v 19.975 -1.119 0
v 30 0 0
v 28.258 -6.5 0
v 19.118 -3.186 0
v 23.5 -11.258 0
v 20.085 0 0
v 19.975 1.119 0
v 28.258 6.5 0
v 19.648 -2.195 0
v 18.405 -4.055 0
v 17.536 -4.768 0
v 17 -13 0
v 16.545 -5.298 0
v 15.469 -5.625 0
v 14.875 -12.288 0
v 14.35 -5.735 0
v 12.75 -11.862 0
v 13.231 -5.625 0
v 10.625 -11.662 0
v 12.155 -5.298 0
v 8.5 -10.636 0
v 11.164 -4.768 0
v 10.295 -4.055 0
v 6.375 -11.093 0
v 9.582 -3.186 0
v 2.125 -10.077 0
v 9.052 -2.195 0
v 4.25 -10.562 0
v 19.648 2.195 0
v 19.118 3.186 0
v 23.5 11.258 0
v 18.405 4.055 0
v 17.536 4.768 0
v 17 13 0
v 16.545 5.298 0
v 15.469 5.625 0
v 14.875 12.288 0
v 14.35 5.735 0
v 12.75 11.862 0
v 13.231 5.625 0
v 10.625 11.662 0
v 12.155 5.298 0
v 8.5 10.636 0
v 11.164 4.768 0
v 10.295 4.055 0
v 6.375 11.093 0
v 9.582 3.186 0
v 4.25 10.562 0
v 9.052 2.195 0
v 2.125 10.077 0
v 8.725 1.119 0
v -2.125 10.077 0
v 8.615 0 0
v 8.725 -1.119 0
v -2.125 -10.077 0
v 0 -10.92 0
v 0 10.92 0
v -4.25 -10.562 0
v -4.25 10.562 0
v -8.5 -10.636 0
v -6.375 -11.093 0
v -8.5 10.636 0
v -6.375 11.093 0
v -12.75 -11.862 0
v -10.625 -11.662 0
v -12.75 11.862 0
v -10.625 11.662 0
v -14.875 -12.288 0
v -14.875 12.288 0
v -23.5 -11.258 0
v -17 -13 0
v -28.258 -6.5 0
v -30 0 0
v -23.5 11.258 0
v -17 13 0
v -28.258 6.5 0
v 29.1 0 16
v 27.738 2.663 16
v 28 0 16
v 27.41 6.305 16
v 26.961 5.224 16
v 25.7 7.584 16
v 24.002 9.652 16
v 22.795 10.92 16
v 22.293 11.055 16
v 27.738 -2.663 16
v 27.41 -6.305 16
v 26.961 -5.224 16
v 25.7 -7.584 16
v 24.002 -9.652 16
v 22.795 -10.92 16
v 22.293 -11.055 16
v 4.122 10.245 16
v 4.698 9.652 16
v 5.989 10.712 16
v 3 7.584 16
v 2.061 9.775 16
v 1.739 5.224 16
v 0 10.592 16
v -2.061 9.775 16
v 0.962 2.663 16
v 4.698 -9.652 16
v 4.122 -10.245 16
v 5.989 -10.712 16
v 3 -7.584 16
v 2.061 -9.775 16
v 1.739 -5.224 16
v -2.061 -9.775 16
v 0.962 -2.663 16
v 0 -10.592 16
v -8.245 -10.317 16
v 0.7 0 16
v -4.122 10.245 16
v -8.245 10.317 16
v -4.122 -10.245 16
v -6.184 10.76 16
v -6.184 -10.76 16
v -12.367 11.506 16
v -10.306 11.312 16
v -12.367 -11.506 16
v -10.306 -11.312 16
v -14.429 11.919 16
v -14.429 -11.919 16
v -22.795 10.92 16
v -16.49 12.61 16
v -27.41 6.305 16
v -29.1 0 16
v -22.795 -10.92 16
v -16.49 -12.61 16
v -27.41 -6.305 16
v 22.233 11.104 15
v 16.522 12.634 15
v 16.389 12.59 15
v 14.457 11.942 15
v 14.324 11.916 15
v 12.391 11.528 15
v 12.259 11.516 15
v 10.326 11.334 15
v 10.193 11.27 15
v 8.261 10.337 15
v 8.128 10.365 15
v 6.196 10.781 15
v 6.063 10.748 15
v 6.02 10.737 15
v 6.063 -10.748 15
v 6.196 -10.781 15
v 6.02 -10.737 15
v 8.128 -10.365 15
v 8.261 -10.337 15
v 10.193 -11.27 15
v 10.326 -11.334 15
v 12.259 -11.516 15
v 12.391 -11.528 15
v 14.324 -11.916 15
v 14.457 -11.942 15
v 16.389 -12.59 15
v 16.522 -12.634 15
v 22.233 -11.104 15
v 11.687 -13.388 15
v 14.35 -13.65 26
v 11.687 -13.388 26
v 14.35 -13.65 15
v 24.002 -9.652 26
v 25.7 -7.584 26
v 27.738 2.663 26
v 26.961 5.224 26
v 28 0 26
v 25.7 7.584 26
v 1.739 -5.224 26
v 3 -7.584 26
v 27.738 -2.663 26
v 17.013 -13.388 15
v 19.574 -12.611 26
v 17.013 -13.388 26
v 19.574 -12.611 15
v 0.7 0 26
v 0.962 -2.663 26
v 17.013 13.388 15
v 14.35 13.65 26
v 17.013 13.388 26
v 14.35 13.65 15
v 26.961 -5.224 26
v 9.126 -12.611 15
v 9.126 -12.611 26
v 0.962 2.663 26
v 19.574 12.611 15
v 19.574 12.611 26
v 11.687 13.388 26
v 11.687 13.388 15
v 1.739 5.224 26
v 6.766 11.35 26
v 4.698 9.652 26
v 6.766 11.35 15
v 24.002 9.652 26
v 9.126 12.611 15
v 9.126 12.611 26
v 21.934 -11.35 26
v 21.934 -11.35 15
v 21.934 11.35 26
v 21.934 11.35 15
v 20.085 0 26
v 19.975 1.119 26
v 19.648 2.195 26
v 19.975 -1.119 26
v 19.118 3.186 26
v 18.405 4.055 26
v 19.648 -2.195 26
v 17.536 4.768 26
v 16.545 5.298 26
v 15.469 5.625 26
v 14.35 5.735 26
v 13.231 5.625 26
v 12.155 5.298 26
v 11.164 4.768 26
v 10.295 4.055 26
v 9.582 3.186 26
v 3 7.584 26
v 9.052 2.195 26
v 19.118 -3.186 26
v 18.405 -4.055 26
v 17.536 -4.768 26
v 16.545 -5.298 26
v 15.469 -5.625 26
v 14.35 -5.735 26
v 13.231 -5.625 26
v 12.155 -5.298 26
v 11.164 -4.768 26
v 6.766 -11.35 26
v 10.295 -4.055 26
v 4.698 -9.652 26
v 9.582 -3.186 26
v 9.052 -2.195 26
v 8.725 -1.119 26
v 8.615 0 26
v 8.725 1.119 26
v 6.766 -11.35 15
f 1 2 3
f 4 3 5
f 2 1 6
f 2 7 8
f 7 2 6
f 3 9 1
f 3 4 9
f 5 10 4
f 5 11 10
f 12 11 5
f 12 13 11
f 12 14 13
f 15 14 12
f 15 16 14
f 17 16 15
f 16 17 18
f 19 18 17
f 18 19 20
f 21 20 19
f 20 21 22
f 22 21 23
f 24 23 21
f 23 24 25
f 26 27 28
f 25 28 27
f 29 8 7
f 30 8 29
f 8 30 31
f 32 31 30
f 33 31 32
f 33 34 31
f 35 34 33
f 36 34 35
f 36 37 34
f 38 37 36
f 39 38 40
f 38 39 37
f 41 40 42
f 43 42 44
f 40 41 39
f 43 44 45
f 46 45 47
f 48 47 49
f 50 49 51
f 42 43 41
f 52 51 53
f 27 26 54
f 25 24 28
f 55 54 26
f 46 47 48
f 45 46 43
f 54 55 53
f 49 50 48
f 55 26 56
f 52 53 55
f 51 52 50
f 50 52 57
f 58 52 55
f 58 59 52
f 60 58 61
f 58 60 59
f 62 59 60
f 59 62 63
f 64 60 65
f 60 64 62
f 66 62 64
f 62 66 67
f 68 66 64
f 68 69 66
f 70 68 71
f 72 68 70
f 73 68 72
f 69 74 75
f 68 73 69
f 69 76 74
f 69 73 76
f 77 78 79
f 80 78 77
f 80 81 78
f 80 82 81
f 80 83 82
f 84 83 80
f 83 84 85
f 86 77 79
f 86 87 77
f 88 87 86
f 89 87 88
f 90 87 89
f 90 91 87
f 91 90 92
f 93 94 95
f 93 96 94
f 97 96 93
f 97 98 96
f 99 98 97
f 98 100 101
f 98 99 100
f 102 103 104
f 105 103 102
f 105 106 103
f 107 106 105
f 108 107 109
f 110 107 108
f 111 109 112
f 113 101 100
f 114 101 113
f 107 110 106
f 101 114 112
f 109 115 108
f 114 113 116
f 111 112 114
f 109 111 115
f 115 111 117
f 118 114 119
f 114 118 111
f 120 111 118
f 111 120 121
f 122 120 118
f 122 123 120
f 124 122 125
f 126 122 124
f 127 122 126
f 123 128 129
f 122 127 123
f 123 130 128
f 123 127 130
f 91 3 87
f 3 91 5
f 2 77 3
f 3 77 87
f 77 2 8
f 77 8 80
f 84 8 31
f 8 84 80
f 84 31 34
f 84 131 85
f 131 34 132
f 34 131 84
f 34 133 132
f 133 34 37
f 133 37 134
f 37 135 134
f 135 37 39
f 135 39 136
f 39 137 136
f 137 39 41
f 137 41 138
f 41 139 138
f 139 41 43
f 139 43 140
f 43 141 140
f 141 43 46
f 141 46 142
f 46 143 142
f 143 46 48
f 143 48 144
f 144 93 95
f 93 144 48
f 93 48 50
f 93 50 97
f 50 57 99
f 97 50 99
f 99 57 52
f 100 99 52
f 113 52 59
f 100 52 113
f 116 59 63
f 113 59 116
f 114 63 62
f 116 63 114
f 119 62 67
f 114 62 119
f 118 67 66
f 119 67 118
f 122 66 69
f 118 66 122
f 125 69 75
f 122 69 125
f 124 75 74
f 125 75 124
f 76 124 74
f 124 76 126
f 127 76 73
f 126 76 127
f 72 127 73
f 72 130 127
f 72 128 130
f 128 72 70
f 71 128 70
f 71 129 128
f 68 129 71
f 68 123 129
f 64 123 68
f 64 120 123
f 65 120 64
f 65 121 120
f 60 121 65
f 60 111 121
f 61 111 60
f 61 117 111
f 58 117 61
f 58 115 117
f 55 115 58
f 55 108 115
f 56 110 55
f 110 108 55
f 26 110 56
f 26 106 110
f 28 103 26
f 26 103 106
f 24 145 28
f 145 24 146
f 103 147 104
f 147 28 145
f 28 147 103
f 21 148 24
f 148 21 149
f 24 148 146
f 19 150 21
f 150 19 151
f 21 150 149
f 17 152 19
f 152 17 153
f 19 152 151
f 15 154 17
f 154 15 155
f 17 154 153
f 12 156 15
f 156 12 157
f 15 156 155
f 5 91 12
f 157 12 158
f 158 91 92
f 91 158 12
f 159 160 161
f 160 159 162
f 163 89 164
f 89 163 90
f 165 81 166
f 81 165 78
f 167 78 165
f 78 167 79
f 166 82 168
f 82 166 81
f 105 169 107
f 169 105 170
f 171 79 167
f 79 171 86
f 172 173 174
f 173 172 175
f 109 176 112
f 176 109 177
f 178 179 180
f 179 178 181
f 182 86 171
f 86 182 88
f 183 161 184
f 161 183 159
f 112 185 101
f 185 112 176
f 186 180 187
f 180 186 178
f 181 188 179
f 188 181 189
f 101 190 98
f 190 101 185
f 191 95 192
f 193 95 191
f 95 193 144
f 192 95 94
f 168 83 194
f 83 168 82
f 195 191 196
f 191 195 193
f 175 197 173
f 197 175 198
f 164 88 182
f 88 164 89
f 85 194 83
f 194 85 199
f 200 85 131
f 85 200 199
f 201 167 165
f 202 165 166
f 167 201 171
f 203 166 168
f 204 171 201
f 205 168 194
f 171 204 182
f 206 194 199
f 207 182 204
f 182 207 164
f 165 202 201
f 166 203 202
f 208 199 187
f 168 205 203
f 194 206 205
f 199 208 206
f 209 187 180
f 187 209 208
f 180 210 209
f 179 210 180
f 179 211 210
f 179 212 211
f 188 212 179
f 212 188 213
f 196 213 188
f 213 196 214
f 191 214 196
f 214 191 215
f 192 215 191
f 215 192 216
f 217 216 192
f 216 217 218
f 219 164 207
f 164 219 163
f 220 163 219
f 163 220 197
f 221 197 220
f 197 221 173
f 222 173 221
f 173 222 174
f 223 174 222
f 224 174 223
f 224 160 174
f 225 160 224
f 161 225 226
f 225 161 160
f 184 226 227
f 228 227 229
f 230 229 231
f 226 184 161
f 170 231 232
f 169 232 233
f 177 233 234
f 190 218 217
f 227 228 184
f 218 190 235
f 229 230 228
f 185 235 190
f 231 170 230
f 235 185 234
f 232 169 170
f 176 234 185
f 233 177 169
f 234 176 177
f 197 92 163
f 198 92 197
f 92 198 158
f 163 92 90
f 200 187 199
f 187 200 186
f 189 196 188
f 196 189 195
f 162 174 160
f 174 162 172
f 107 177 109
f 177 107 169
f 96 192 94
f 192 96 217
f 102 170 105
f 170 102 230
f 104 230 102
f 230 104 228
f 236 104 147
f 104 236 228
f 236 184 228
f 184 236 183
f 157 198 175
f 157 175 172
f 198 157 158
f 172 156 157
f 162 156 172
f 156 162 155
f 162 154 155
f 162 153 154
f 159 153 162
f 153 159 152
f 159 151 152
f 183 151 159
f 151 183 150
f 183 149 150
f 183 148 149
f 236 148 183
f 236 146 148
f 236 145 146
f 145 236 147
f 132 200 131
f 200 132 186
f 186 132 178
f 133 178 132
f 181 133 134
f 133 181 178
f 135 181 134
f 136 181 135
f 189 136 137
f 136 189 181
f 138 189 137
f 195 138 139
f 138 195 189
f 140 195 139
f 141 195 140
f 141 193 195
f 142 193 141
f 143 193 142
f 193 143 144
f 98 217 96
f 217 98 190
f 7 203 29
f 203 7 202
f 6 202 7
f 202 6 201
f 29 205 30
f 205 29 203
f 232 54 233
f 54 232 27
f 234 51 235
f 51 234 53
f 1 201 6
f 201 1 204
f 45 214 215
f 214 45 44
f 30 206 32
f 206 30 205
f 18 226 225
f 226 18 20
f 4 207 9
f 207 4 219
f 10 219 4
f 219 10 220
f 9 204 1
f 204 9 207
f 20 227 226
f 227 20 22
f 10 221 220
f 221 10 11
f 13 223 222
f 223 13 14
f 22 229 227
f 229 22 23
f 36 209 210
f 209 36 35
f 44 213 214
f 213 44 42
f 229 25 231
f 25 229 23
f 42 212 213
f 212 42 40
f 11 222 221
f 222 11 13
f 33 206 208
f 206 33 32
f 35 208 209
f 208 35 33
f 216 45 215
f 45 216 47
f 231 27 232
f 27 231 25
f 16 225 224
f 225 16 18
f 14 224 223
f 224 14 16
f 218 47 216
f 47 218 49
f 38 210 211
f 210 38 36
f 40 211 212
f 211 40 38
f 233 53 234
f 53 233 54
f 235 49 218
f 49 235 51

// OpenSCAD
$fn = 32;

// ----------------------------------------------------------------------
// Handle: 60 x 26 mm grip, 16 mm thick
// ----------------------------------------------------------------------

// --- parameters (mm) ---
length = 60;              // grip length
width = 26;               // grip width
thickness = 16;           // grip thickness
waist = 0.8;              // width factor at the middle
draft = 0.97;             // top face scale of the extrusion
scallops = 6;             // finger rests per side
ripple = 0.05;            // depth factor of the finger rests
boss_d = 27.3;            // mounting boss diameter
boss_h = 10;              // mounting boss height
boss_hole_d = 11.47;      // screw clearance through the boss
boss_r = 14.35;           // boss centre from the grip centre

/* ergonomic grip outline, closed spline-like polygon in the XY plane */
grip = [[-17, 13], [-14.875, 12.288], [-12.75, 11.862], [-10.625, 11.662], [-8.5, 10.636], [-6.375, 11.093], [-4.25, 10.562], [-2.125, 10.077], [0, 10.92], [2.125, 10.077], [4.25, 10.562], [6.375, 11.093], [8.5, 10.636], [10.625, 11.662], [12.75, 11.862], [14.875, 12.288], [17, 13], [23.5, 11.258], [28.258, 6.5], [30, 0], [28.258, -6.5], [23.5, -11.258], [17, -13], [17, -13], [14.875, -12.288], [12.75, -11.862], [10.625, -11.662], [8.5, -10.636], [6.375, -11.093], [4.25, -10.562], [2.125, -10.077], [0, -10.92], [-2.125, -10.077], [-4.25, -10.562], [-6.375, -11.093], [-8.5, -10.636], [-10.625, -11.662], [-12.75, -11.862], [-14.875, -12.288], [-17, -13], [-23.5, -11.258], [-28.258, -6.5], [-30, 0], [-28.258, 6.5], [-23.5, 11.258], [-17, 13]];

module grip_body() {
  linear_extrude(height = thickness, scale = draft) polygon(grip);
}

module boss_body() {
  /* sunk 1 mm into the grip so the joint overlaps */
  translate([boss_r, 0, thickness - 1]) cylinder(h = boss_h + 1, d = boss_d);
}

difference() {
  union() {
    grip_body();
    boss_body();
  }
  translate([boss_r, 0, -1]) cylinder(h = thickness + boss_h + 2, d = boss_hole_d);
}
